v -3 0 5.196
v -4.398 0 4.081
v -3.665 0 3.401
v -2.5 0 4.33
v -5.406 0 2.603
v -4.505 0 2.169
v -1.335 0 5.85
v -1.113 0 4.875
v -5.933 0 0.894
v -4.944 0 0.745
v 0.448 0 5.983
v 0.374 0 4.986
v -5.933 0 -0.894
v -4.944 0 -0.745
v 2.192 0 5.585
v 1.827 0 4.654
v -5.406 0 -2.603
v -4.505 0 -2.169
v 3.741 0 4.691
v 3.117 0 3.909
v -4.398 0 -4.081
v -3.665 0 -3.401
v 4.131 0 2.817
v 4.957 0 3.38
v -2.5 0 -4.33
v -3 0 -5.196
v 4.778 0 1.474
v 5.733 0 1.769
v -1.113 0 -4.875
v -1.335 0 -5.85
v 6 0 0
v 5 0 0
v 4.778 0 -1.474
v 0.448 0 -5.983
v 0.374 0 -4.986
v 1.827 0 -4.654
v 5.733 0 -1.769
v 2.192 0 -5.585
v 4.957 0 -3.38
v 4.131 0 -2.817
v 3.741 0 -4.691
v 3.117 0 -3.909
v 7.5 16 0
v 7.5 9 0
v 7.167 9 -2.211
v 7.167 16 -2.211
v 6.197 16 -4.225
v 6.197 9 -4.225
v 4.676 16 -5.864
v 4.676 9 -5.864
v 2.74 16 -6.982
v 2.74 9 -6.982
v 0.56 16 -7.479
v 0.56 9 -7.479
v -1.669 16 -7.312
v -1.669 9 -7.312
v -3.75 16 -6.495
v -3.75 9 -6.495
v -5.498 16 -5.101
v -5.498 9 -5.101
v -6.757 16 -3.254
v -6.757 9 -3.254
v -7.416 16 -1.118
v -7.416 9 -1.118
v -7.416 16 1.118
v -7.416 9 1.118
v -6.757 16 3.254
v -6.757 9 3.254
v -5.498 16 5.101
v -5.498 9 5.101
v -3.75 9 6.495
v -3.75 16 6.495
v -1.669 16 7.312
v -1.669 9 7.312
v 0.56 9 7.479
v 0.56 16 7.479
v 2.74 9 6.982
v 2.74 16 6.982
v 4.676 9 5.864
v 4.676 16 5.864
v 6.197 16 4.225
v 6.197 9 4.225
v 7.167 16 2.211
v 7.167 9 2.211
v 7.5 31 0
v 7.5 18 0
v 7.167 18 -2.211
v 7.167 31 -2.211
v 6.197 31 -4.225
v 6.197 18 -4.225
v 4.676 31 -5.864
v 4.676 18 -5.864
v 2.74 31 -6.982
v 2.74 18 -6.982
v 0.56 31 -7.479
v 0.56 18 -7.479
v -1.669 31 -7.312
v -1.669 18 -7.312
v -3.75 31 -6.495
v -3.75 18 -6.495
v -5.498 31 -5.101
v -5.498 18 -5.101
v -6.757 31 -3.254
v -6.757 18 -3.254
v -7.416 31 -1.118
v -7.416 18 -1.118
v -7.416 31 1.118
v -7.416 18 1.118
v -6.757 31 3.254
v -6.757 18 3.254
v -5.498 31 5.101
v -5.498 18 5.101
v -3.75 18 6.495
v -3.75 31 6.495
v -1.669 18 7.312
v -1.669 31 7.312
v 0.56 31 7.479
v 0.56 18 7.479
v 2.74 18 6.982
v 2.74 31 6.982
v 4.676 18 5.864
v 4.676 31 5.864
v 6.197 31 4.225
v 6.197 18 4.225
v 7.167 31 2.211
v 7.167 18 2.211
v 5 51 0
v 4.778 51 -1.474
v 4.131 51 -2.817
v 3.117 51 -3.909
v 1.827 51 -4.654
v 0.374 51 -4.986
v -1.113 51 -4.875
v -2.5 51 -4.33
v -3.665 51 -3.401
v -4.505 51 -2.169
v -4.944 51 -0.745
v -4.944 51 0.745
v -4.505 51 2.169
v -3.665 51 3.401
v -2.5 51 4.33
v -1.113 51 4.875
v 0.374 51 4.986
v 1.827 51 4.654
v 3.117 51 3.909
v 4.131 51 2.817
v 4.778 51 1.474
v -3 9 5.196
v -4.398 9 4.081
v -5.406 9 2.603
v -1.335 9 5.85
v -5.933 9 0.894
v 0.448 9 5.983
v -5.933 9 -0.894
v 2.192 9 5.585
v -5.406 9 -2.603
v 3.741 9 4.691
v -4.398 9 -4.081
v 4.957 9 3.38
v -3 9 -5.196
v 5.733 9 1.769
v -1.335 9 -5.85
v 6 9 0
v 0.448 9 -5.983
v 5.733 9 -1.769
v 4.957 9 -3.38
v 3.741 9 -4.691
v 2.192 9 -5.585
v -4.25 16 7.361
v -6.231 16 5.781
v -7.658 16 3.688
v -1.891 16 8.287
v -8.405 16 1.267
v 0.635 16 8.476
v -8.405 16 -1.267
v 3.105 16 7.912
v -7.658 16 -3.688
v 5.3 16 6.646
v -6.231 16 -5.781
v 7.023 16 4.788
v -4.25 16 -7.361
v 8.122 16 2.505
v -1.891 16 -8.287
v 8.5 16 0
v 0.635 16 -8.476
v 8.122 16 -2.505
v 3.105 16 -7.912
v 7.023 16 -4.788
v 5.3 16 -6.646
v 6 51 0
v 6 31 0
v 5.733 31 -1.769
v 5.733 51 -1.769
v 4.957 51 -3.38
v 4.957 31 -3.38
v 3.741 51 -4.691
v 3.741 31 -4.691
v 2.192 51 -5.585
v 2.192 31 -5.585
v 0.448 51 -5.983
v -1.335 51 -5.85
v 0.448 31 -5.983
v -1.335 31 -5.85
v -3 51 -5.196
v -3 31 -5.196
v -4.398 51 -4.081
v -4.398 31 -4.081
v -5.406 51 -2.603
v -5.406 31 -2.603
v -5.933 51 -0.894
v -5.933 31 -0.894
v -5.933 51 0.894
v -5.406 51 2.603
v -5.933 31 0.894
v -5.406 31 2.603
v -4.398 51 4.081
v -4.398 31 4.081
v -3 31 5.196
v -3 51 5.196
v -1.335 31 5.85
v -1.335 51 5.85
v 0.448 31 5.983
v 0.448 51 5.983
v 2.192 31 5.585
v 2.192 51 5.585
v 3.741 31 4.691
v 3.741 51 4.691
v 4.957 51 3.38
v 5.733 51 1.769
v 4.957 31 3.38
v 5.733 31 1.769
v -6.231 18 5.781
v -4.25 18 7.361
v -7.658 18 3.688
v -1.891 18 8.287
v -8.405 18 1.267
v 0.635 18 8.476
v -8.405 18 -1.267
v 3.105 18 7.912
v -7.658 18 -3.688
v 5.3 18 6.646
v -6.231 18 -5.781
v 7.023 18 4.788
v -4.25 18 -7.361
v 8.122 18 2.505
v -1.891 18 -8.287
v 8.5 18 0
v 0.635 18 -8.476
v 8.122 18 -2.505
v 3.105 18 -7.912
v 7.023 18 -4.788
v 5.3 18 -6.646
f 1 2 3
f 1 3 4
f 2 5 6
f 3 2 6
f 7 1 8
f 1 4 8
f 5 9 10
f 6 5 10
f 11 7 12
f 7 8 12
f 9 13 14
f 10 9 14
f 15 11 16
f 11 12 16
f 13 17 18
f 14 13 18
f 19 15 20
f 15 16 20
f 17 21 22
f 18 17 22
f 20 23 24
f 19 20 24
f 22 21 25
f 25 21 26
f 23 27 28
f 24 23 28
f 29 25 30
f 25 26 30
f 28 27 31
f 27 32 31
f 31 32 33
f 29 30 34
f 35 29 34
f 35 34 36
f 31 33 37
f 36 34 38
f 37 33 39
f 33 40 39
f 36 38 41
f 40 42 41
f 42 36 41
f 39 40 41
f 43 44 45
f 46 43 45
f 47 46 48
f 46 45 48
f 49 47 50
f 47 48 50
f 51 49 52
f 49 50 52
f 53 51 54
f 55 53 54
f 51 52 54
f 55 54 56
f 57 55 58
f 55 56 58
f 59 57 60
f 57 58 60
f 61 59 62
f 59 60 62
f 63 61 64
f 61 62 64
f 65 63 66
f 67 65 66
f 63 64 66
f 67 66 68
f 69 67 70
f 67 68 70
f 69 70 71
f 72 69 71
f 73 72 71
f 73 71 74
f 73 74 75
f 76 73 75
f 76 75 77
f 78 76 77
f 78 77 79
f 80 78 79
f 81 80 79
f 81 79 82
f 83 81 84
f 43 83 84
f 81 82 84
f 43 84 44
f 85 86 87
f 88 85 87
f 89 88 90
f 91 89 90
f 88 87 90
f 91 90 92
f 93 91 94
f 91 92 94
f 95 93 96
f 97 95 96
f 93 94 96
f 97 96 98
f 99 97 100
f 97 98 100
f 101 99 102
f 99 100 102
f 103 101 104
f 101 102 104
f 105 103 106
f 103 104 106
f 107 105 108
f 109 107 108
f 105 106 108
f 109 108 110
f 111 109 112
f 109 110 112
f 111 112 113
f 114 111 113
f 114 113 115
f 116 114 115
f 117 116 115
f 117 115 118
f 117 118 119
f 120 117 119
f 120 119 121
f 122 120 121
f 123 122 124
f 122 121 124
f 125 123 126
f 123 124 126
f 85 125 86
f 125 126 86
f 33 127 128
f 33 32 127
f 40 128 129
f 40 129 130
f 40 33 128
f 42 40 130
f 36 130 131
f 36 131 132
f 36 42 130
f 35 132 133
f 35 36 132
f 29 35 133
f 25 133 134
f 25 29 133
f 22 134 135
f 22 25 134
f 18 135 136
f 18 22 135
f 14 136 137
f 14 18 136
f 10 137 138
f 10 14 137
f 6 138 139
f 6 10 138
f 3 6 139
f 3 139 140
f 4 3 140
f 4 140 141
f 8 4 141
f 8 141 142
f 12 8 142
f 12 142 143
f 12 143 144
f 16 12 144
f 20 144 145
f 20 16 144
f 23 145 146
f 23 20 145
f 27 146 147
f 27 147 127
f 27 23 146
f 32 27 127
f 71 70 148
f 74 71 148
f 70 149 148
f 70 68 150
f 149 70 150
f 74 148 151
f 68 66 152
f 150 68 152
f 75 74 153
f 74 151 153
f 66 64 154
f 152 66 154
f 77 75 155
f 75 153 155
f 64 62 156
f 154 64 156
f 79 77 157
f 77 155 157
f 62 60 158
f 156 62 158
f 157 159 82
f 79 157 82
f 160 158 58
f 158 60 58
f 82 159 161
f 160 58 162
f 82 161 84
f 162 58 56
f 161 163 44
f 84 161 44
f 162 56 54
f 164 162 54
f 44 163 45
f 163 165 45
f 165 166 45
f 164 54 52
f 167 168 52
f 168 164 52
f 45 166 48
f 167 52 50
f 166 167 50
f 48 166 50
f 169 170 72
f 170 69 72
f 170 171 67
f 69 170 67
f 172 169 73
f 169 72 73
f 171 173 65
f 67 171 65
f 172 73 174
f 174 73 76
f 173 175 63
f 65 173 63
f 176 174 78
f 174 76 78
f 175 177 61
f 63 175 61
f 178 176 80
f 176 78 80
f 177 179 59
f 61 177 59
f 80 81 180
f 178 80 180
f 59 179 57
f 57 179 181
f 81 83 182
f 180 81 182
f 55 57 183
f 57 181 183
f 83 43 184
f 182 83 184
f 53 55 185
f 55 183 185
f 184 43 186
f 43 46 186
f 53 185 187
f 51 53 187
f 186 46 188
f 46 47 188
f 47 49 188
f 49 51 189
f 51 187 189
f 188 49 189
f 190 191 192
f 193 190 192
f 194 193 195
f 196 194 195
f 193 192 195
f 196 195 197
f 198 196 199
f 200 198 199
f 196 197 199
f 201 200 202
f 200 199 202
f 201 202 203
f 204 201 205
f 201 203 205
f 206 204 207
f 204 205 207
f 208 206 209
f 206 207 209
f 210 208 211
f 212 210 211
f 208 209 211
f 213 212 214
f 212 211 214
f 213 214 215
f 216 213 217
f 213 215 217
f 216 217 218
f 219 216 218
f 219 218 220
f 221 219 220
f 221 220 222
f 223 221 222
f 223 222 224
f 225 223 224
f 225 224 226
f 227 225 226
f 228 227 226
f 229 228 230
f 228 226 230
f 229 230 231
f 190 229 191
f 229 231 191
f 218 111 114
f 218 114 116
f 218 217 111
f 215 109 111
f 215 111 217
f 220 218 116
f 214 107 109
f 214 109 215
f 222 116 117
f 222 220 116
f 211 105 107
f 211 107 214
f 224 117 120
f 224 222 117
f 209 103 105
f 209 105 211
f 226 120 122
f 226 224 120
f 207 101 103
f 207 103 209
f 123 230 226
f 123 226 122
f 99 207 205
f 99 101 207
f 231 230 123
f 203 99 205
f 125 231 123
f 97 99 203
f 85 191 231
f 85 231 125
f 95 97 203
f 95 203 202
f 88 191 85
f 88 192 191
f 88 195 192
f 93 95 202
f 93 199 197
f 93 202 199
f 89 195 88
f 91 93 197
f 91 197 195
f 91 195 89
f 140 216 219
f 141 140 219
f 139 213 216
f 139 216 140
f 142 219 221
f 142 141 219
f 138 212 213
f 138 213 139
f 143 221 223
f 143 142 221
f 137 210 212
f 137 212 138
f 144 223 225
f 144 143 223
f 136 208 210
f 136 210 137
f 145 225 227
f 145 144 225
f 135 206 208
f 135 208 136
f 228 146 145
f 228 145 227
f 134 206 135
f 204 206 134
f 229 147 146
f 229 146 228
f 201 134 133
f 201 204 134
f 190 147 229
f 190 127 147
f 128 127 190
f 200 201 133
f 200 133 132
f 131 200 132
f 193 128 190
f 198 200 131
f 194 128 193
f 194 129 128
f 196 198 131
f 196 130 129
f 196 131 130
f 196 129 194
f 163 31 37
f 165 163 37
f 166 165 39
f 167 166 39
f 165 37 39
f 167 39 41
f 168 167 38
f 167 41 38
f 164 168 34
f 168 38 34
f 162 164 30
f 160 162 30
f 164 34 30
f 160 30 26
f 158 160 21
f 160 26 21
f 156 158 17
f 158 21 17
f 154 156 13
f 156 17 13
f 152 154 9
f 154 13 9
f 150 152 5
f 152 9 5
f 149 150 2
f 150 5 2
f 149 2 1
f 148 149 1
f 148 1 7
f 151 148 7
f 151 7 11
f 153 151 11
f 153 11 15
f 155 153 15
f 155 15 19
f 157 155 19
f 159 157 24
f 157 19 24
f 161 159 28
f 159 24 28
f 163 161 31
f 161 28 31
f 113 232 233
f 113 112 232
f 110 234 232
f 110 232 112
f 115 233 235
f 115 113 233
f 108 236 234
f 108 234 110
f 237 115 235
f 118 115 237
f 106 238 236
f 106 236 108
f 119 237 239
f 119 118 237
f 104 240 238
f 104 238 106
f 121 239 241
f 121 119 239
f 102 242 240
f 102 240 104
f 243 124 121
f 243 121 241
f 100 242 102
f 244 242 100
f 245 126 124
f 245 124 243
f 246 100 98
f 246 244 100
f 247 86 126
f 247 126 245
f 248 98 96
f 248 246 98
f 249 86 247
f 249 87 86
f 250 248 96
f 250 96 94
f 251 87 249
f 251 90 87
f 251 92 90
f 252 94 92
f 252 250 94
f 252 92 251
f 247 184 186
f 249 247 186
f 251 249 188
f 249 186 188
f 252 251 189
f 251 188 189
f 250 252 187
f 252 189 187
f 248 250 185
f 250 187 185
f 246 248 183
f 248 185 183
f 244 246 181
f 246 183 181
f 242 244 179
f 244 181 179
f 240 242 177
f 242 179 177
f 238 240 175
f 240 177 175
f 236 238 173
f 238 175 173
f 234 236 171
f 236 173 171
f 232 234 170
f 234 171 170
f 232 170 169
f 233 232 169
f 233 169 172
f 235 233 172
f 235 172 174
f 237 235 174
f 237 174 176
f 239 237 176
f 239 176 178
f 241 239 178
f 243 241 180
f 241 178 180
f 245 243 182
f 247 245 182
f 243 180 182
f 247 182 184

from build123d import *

# Parameters (mm, degrees)
ESQUISSE1_R        = 6
ESQUISSE1_R_2      = 5
BOSS_EXTRU_1_DEPTH = 9
ESQUISSE2_R        = 7.5
ESQUISSE2_R_2      = 5
BOSS_EXTRU_2_DEPTH = 7
ESQUISSE3_R        = 8.5
ESQUISSE3_R_2      = 5
BOSS_EXTRU_3_DEPTH = 2
ESQUISSE4_R        = 7.5
ESQUISSE4_R_2      = 5
BOSS_EXTRU_4_DEPTH = 13
ESQUISSE5_R        = 6
ESQUISSE5_R_2      = 5
BOSS_EXTRU_5_DEPTH = 20


with BuildPart() as part:
    # Esquisse1 → Boss.-Extru.1 (new body)
    with BuildSketch(Plane(origin=(0, 0, 0), x_dir=(1, 0, 0), z_dir=(0, 1, 0))):
        Circle(ESQUISSE1_R)
        Circle(ESQUISSE1_R_2, mode=Mode.SUBTRACT)
    extrude(amount=BOSS_EXTRU_1_DEPTH)

    # Esquisse2 → Boss.-Extru.2 (add)
    with BuildSketch(Plane(origin=(0, 9, 0), x_dir=(1, 0, 0), z_dir=(0, 1, 0))):
        Circle(ESQUISSE2_R)
        Circle(ESQUISSE2_R_2, mode=Mode.SUBTRACT)
    extrude(amount=BOSS_EXTRU_2_DEPTH)

    # Esquisse3 → Boss.-Extru.3 (add)
    with BuildSketch(Plane(origin=(0, 16, 0), x_dir=(1, 0, 0), z_dir=(0, 1, 0))):
        Circle(ESQUISSE3_R)
        Circle(ESQUISSE3_R_2, mode=Mode.SUBTRACT)
    extrude(amount=BOSS_EXTRU_3_DEPTH)

    # Esquisse4 → Boss.-Extru.4 (add)
    with BuildSketch(Plane(origin=(0, 18, 0), x_dir=(1, 0, 0), z_dir=(0, 1, 0))):
        Circle(ESQUISSE4_R)
        Circle(ESQUISSE4_R_2, mode=Mode.SUBTRACT)
    extrude(amount=BOSS_EXTRU_4_DEPTH)

    # Esquisse5 → Boss.-Extru.5 (add)
    with BuildSketch(Plane(origin=(0, 31, 0), x_dir=(1, 0, 0), z_dir=(0, 1, 0))):
        Circle(ESQUISSE5_R)
        Circle(ESQUISSE5_R_2, mode=Mode.SUBTRACT)
    extrude(amount=BOSS_EXTRU_5_DEPTH)


solid = part.part
